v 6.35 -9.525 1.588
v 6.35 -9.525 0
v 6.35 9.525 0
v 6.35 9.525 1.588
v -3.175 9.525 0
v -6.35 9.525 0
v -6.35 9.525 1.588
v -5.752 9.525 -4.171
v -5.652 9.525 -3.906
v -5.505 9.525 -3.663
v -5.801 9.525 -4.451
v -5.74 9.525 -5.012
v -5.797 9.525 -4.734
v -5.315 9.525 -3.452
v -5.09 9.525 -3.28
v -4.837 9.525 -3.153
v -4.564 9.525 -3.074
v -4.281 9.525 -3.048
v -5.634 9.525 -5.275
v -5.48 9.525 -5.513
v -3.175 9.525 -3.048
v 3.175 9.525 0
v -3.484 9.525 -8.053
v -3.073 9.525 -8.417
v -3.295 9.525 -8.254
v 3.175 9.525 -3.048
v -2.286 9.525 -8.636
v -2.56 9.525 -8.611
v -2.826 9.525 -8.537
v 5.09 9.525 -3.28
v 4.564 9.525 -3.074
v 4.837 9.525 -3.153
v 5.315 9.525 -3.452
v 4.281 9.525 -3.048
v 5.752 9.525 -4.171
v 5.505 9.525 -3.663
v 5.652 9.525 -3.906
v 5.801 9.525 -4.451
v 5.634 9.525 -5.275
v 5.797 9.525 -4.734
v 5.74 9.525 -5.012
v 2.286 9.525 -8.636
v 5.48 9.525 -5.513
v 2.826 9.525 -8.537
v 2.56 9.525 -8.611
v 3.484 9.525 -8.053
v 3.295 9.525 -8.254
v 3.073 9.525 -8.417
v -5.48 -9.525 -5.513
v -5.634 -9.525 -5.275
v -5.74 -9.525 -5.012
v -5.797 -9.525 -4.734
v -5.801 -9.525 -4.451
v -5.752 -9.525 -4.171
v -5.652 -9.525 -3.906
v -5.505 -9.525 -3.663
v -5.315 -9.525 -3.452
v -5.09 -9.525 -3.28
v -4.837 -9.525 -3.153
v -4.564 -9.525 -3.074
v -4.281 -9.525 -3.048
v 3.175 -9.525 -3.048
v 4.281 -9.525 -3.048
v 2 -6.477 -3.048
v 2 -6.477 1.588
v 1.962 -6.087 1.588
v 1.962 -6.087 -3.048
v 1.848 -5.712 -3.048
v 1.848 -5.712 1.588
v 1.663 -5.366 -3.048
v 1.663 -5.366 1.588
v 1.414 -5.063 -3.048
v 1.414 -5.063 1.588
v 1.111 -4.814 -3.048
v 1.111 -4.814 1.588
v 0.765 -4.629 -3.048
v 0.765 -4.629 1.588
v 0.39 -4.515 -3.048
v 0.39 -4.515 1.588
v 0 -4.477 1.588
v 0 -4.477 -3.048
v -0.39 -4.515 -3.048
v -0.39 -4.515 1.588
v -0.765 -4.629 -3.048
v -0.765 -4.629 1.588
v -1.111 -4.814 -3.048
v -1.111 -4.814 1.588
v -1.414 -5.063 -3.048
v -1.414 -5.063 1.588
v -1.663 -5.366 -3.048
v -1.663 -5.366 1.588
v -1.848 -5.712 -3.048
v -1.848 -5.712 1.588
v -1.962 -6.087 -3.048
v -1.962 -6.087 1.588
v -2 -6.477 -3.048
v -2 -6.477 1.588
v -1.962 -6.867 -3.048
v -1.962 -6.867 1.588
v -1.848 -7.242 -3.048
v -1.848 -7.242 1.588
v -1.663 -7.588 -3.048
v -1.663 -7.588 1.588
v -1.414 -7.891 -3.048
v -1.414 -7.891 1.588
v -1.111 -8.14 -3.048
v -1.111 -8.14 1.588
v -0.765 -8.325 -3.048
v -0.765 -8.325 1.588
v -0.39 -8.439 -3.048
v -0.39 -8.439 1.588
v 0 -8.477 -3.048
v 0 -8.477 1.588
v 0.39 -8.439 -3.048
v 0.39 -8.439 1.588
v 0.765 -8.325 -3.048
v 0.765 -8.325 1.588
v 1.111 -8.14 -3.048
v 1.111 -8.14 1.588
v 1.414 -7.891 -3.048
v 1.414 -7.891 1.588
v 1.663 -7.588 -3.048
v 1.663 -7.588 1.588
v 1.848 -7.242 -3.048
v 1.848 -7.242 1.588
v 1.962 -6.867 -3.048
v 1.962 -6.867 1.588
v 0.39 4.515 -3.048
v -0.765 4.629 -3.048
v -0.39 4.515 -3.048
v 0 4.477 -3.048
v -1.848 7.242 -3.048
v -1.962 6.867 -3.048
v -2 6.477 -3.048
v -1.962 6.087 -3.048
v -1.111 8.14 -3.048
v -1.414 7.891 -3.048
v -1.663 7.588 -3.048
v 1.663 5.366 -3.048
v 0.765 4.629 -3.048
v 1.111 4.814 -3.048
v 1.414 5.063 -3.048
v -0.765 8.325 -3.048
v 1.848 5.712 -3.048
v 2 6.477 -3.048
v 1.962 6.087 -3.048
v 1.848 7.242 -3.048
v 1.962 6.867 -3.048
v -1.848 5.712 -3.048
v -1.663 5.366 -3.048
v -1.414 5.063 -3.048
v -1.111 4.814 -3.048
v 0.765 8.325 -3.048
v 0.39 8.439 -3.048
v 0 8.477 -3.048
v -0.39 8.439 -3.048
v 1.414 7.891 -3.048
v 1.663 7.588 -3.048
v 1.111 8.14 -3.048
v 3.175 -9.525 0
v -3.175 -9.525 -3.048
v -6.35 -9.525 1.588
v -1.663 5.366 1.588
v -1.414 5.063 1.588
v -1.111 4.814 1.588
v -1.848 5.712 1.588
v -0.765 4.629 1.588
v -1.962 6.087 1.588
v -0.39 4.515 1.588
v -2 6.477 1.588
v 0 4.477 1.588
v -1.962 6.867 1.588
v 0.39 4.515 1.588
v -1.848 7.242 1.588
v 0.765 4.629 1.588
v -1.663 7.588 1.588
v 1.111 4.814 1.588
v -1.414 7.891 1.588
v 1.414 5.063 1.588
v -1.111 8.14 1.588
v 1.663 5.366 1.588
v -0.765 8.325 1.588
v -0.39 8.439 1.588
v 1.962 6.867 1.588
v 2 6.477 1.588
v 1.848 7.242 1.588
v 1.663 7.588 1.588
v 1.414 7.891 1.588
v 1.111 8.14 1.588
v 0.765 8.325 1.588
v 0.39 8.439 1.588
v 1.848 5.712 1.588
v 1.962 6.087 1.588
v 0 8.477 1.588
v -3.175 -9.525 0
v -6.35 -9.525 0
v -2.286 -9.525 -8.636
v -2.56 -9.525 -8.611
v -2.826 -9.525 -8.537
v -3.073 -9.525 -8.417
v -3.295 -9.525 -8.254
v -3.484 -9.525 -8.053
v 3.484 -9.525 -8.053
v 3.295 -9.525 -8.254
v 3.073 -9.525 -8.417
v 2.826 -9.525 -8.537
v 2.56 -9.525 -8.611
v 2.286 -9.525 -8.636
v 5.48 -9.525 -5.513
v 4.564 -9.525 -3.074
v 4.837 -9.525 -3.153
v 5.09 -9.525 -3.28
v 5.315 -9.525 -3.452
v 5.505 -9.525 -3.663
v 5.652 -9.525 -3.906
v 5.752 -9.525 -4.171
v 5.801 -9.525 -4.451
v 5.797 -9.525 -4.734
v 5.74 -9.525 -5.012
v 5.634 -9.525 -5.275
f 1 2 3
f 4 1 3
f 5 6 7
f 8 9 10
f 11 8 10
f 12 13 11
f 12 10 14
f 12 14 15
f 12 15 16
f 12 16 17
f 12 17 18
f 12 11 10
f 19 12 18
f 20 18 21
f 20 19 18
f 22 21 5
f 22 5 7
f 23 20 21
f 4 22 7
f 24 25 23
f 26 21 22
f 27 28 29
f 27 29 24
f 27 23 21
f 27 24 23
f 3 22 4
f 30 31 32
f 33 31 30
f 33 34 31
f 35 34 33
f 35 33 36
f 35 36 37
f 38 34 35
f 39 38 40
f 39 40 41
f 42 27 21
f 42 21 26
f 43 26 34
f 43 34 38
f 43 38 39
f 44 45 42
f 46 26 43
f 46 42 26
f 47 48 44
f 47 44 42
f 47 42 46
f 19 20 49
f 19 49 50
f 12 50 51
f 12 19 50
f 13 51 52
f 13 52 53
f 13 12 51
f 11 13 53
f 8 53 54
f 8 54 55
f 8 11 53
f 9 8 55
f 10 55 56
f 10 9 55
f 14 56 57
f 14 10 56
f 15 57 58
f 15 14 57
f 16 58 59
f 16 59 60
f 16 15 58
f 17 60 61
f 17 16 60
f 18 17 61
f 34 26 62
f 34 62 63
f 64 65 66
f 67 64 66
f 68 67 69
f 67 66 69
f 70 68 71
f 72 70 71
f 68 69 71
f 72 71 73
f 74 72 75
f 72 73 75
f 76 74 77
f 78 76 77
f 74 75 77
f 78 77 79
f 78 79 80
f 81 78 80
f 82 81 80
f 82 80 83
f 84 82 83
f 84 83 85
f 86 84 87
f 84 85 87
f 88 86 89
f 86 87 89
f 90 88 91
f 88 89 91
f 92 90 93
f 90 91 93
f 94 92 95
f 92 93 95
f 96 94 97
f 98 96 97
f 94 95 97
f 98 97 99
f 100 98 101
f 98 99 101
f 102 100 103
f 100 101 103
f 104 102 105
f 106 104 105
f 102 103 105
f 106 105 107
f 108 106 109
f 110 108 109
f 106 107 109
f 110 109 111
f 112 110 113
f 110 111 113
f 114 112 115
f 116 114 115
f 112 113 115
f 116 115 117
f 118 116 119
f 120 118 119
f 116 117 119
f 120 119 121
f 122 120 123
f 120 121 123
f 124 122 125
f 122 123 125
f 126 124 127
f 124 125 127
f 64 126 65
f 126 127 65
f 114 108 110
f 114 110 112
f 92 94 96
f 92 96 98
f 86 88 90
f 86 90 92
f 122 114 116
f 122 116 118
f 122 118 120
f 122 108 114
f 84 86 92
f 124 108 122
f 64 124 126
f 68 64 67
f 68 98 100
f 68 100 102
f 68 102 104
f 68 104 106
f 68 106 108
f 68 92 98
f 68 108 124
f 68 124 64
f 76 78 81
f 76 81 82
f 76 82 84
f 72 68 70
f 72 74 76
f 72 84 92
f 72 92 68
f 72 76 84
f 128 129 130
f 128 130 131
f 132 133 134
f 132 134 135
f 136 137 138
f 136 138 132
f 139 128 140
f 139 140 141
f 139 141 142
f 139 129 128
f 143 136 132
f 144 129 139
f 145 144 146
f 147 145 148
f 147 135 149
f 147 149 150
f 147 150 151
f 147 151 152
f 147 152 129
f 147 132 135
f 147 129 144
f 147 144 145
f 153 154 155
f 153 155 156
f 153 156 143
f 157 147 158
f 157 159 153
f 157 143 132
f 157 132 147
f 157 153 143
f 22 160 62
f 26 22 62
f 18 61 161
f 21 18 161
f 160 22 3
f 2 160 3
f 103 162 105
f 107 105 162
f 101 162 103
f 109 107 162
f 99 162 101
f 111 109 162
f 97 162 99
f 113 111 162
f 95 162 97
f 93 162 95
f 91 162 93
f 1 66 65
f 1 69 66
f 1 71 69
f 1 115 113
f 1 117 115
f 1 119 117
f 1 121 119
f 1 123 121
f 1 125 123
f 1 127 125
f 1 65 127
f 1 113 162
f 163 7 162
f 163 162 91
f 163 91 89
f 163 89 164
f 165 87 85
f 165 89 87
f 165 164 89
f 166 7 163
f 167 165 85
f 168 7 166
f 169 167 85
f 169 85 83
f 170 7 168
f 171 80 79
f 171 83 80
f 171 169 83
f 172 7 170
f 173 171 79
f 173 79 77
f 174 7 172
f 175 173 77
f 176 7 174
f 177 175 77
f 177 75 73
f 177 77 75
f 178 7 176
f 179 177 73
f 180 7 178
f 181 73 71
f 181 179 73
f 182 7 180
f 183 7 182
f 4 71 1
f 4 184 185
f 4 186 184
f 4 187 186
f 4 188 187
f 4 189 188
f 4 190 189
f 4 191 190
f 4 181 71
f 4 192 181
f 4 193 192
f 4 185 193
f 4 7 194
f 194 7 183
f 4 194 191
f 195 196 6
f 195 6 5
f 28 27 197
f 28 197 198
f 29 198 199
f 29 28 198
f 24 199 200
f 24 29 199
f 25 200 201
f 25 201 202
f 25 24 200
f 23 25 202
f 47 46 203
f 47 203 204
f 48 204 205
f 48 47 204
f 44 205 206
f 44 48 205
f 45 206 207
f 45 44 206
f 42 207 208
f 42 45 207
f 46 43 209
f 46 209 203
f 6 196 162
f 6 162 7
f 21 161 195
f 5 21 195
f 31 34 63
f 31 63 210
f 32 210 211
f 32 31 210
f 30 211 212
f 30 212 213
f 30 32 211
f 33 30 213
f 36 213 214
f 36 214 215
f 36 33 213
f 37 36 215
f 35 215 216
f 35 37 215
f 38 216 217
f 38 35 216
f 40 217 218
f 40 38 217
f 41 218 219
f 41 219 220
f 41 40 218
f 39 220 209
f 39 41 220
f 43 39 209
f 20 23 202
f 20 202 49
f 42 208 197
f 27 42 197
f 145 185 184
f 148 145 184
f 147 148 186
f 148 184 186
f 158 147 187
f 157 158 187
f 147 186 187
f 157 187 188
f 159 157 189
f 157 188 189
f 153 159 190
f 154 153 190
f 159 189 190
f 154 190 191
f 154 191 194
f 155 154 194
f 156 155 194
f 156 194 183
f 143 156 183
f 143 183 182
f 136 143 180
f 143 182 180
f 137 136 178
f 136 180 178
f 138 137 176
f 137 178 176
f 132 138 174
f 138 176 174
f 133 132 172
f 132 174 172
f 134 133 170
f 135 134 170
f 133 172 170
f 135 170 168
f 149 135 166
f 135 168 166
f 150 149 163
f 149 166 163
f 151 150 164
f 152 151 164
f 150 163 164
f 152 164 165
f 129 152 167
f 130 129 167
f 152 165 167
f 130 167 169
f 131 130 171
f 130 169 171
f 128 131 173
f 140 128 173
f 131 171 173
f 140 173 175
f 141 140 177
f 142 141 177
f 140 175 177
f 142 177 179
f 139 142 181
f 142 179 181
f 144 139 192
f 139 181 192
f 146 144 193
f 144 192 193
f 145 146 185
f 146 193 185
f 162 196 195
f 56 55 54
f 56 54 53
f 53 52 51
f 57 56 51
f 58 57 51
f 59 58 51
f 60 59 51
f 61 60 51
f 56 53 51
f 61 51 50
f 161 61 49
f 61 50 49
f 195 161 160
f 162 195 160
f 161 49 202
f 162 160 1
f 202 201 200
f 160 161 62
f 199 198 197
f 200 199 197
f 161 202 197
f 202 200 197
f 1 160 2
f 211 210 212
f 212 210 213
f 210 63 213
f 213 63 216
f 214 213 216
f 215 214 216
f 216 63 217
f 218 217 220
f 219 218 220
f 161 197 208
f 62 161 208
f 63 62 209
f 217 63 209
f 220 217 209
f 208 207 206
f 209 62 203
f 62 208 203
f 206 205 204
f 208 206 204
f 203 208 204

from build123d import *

# Parameters (mm, degrees)
SKETCH1_W           = 12.7
SKETCH1_H           = 19.05
BOSS_EXTRUDE1_DEPTH = 1.5875
BOSS_EXTRUDE2_DEPTH = 19.05
SKETCH4_R           = 2
CUT_EXTRUDE1_DEPTH  = 4.6355


with BuildPart() as part:
    # Sketch1 → Boss-Extrude1 (new body)
    with BuildSketch(Plane.XY):
        Rectangle(SKETCH1_W, SKETCH1_H)
    extrude(amount=BOSS_EXTRUDE1_DEPTH)

    # Sketch2 → Boss-Extrude2 (add)
    with BuildSketch(Plane(origin=(0, 9.525, 0), x_dir=(1, 0, 0), z_dir=(0, 1, 0))):
        with BuildLine():
            Line((3.175, 0), (3.175, 3.048))
            Line((3.175, 3.048), (4.281466055, 3.048))
            ThreePointArc((4.281466055, 3.048), (5.652123405, 3.905760984), (5.479872098, 5.513487629))
            Line((5.479872098, 5.513487629), (3.484406043, 8.053487629))
            ThreePointArc((3.484406043, 8.053487629), (2.952239016, 8.482657351), (2.286, 8.636))
            Line((2.286, 8.636), (-2.286, 8.636))
            ThreePointArc((-2.286, 8.636), (-2.952239016, 8.482657351), (-3.484406043, 8.053487629))
            Line((-3.484406043, 8.053487629), (-5.479872098, 5.513487629))
            ThreePointArc((-5.479872098, 5.513487629), (-5.652123405, 3.905760984), (-4.281466055, 3.048))
            Line((-4.281466055, 3.048), (-3.175, 3.048))
            Line((-3.175, 3.048), (-3.175, 0))
            Line((-3.175, 0), (3.175, 0))
        make_face()
    extrude(amount=-BOSS_EXTRUDE2_DEPTH)

    # Sketch4 → Cut-Extrude1 (cut)
    with BuildSketch(Plane.XY.offset(1.5875)):
        with Locations((0, 6.477)):
            Circle(SKETCH4_R)
        with Locations((0, -6.477)):
            Circle(SKETCH4_R)
    extrude(amount=-CUT_EXTRUDE1_DEPTH, mode=Mode.SUBTRACT)


solid = part.part
